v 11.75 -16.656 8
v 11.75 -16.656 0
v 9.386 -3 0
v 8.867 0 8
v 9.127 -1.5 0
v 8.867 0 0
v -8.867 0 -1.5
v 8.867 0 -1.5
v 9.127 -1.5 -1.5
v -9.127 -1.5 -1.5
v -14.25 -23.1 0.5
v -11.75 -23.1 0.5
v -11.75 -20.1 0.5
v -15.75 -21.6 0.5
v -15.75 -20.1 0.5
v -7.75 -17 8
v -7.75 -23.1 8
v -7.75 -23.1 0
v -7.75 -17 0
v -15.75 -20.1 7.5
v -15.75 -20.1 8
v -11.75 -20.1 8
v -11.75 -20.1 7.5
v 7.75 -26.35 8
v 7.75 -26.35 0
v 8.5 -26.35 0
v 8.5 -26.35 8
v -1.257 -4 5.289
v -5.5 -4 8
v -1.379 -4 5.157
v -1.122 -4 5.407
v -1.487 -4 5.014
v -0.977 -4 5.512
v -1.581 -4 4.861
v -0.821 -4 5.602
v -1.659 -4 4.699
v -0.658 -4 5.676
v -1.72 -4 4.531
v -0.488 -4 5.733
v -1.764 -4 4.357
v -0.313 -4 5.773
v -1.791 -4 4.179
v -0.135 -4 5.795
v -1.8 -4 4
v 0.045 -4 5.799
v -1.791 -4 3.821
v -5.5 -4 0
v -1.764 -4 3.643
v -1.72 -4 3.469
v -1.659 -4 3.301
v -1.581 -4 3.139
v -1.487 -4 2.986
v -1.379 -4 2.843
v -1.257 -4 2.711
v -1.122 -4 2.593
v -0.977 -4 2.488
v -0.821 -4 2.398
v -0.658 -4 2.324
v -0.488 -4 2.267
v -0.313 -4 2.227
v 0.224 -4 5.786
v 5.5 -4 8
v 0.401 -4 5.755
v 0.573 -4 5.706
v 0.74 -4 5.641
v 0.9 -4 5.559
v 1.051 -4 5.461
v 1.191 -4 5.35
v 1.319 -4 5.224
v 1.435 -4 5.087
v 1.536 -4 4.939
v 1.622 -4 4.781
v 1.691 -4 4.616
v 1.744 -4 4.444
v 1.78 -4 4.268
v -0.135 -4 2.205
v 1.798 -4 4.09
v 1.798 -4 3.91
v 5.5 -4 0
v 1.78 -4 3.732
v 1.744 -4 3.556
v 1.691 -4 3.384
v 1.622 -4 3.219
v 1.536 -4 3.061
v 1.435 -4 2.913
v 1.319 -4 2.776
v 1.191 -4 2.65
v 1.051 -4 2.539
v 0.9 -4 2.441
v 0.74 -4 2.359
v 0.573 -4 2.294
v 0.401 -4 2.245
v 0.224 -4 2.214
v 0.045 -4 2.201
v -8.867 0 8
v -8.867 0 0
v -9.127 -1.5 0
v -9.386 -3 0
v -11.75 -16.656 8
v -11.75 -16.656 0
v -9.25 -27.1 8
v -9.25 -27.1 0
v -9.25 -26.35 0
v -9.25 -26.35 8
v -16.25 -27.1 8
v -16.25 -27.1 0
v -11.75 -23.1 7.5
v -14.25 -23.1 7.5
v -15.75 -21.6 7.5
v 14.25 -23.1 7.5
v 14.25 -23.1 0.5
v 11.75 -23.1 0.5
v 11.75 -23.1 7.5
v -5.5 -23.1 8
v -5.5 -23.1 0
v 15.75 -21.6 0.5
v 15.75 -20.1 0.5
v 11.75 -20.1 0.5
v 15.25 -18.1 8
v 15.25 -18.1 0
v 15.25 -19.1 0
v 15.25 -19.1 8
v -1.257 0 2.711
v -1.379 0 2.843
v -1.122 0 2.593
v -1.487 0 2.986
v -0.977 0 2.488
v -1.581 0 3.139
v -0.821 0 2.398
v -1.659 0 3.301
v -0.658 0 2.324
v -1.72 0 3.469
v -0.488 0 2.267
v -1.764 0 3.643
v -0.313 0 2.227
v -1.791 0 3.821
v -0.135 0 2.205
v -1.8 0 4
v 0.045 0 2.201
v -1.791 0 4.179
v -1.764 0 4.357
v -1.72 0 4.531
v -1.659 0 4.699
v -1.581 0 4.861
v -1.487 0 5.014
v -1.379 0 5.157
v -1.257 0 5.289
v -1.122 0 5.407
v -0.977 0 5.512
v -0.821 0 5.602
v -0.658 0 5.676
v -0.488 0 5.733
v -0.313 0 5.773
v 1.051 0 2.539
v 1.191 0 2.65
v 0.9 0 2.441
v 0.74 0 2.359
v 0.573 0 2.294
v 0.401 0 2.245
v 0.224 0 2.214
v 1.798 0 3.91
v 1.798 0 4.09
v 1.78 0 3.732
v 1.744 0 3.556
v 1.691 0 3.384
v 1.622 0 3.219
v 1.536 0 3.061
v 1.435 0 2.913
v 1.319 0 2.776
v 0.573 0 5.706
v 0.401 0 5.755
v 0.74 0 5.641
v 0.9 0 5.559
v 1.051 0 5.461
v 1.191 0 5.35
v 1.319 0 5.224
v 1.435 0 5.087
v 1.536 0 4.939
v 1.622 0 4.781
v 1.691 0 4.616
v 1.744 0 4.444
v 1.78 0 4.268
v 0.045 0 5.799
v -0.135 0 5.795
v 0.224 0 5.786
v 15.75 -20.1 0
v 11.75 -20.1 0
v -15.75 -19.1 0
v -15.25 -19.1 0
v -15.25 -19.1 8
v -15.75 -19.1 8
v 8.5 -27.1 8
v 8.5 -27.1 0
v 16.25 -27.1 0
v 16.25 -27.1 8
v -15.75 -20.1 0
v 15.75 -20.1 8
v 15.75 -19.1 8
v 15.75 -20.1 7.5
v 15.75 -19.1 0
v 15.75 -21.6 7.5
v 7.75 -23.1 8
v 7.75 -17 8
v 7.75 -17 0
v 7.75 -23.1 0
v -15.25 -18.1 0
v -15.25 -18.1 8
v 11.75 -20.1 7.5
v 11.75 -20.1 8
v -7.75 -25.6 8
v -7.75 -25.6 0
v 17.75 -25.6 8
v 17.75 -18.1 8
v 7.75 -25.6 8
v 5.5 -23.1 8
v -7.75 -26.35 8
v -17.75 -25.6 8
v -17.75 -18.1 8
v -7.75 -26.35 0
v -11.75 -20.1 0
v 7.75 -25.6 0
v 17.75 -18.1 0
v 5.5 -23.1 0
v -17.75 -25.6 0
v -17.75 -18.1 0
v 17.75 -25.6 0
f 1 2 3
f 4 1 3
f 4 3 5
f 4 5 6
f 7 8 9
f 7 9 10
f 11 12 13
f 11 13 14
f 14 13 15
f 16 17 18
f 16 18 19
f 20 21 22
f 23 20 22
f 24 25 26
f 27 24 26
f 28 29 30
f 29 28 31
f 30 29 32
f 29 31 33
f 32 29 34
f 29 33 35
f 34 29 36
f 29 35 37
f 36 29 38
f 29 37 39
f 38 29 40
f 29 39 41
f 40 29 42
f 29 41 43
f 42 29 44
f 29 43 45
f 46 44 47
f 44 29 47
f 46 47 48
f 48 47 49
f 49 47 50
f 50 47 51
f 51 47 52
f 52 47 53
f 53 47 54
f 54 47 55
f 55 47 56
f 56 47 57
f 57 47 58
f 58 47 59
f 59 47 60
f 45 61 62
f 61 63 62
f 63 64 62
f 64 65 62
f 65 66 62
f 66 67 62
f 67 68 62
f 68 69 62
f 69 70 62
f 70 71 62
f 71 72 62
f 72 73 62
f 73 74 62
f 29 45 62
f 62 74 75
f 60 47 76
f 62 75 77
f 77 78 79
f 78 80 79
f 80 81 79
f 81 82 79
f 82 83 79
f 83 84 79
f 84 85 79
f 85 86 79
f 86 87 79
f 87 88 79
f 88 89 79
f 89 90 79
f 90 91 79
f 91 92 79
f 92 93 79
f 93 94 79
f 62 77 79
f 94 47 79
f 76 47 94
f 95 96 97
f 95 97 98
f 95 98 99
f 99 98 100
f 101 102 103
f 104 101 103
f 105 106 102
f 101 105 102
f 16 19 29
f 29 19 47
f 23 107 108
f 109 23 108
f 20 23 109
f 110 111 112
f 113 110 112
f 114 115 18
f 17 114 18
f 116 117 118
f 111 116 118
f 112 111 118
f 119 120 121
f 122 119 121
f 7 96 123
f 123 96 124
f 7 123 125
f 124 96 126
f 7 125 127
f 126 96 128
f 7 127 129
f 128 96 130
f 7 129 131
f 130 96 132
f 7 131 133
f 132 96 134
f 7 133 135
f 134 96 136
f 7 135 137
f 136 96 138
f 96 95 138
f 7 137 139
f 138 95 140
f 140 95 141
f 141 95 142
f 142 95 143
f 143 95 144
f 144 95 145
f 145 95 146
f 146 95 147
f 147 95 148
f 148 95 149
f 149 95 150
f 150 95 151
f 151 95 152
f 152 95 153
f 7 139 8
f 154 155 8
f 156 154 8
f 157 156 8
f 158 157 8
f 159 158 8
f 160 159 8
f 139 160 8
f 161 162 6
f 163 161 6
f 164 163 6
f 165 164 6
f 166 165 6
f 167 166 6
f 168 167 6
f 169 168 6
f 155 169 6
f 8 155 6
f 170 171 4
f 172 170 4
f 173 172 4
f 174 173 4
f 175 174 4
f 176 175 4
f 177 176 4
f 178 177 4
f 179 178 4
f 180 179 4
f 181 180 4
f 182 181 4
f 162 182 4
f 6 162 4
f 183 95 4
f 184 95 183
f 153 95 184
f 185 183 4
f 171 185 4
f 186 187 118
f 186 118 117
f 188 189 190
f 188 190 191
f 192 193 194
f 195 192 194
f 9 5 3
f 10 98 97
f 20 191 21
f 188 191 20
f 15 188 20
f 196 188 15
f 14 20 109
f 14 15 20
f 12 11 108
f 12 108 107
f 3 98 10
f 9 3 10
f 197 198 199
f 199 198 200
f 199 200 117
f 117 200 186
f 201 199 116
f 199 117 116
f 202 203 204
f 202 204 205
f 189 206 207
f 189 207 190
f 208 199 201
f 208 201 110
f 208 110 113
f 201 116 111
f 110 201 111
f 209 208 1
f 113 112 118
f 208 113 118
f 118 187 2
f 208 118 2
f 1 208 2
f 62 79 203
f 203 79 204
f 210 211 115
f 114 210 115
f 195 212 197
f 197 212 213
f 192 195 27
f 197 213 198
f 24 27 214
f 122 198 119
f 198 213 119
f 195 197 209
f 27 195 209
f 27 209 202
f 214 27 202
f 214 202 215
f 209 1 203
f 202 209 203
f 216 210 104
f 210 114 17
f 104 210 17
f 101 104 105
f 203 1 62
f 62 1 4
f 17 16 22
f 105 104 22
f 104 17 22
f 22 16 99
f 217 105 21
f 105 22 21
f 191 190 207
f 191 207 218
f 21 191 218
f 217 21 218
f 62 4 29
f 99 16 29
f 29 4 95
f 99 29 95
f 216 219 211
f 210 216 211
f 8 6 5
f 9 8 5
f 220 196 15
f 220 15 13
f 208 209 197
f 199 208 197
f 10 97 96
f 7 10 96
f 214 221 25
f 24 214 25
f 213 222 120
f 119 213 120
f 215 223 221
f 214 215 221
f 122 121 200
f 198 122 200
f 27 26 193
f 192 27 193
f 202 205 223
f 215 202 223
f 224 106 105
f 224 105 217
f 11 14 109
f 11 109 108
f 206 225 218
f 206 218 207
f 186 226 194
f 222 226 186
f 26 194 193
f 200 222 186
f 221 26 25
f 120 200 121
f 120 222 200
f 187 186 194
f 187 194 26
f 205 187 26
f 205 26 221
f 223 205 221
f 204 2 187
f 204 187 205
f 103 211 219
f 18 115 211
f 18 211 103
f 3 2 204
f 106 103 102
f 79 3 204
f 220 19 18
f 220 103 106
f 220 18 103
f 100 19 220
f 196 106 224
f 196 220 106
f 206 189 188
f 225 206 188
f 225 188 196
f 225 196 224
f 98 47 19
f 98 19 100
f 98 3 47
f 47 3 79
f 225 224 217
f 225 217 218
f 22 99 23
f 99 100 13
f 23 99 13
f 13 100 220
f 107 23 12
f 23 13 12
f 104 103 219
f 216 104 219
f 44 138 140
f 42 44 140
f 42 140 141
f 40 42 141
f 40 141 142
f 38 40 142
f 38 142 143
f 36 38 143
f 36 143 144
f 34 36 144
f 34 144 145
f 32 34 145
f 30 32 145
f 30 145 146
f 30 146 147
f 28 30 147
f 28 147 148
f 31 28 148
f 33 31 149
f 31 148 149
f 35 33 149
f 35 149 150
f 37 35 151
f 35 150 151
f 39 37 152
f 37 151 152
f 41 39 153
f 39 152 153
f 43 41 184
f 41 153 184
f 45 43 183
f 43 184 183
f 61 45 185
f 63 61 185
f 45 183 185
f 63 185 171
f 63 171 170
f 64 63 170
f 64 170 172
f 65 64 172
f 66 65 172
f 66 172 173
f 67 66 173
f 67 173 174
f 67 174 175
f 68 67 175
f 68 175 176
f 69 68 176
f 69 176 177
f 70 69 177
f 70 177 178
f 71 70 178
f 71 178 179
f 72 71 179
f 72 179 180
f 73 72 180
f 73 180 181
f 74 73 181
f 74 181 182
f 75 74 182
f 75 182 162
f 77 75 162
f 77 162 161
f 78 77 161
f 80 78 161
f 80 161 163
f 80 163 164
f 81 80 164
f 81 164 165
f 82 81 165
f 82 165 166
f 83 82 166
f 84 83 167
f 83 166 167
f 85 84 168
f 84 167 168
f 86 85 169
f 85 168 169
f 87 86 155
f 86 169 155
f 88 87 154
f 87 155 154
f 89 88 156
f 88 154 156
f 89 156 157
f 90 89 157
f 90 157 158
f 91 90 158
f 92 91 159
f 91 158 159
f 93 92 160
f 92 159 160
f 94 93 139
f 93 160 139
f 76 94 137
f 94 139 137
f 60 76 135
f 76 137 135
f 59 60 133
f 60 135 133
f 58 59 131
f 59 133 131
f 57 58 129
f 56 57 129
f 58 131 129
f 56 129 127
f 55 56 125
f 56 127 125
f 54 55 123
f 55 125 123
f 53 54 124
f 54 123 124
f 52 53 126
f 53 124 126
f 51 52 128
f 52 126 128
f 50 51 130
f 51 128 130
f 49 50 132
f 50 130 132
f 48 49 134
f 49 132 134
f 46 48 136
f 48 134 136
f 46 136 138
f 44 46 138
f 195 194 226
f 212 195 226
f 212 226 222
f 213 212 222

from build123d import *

# Parameters (mm, degrees)
BOSS_EXTRUDE1_DEPTH = 8
SKETCH2_R           = 1.8
CUT_EXTRUDE1_DEPTH  = 31.60183818
BOSS_EXTRUDE4_DEPTH = 8
BOSS_EXTRUDE5_DEPTH = 0.5
BOSS_EXTRUDE6_START = -8
BOSS_EXTRUDE6_DEPTH = 0.5
BOSS_EXTRUDE3_DEPTH = 1.5
CHAMFER3_SIZE       = 1.5


with BuildPart() as part:
    # Sketch1 → Boss-Extrude1 (new body)
    with BuildSketch(Plane.XY):
        Polygon((8.867161478, 0), (-8.867161478, 0), (-11.75, -16.656400352), (-11.75, -27.1), (-9.25, -27.1), (-9.25, -26.35), (-7.75, -26.35), (-7.75, -25.6), (-5.5, -23.1), (-7.75, -23.1), (-7.75, -17), (-5.5, -4), (5.5, -4), (7.75, -17), (7.75, -23.1), (5.5, -23.1), (7.75, -25.6), (7.75, -26.35), (8.5, -26.35), (8.5, -27.1), (11.75, -27.1), (11.75, -16.656400352), align=None)
    extrude(amount=BOSS_EXTRUDE1_DEPTH)

    # Sketch2 → Cut-Extrude1 (cut, through all)
    with BuildSketch(Plane(origin=(0, 0, 0), x_dir=(1, 0, 0), z_dir=(0, 1, 0))):
        with Locations(Location((0, -4, 0), (0, 0, 180))):
            Circle(SKETCH2_R)
    extrude(amount=-CUT_EXTRUDE1_DEPTH, mode=Mode.SUBTRACT)

    # Sketch7 → Boss-Extrude4 (add)
    with BuildSketch(Plane(origin=(0, 0, 0), x_dir=(-1, 0, 0), z_dir=(0, 0, -1))):
        Polygon((-11.75, -27.1), (-16.25, -27.1), (-17.75, -25.6), (-17.75, -18.1), (-15.25, -18.1), (-15.25, -19.1), (-15.75, -19.1), (-15.75, -21.6), (-14.25, -23.1), (-11.75, -23.1), align=None)
        Polygon((16.25, -27.1), (17.75, -25.6), (17.75, -18.1), (15.25, -18.1), (15.25, -19.1), (15.75, -19.1), (15.75, -21.6), (14.25, -23.1), (11.75, -23.1), (11.75, -27.1), align=None)
    extrude(amount=-BOSS_EXTRUDE4_DEPTH)

    # Sketch8 → Boss-Extrude5 (add)
    with BuildSketch(Plane(origin=(0, 0, 0), x_dir=(-1, 0, 0), z_dir=(0, 0, -1))):
        Polygon((-11.75, -23.1), (-11.75, -20.1), (-15.75, -20.1), (-15.75, -21.6), (-14.25, -23.1), align=None)
        Polygon((15.75, -20.1), (11.75, -20.1), (11.75, -23.1), (14.25, -23.1), (15.75, -21.6), align=None)
    extrude(amount=-BOSS_EXTRUDE5_DEPTH)

    # Sketch8<2> → Boss-Extrude6 (add)
    with BuildSketch(Plane(origin=(0, 0, 0), x_dir=(-1, 0, 0), z_dir=(0, 0, -1)).offset(BOSS_EXTRUDE6_START)):
        Polygon((-11.75, -23.1), (-11.75, -20.1), (-15.75, -20.1), (-15.75, -21.6), (-14.25, -23.1), align=None)
        Polygon((15.75, -20.1), (11.75, -20.1), (11.75, -23.1), (14.25, -23.1), (15.75, -21.6), align=None)
    extrude(amount=BOSS_EXTRUDE6_DEPTH)

    # Sketch5 → Boss-Extrude3 (add)
    with BuildSketch(Plane(origin=(0, 0, 0), x_dir=(-1, 0, 0), z_dir=(0, 0, -1))):
        Polygon((8.867161478, 0), (-8.867161478, 0), (-9.126776862, -1.5), (9.126776862, -1.5), align=None)
    extrude(amount=BOSS_EXTRUDE3_DEPTH)

    # Chamfer3
    # the kernel refuses this chamfer: 1.5 mm, written as the material it adds along each edge
    with BuildSketch(Plane(origin=(12.984301344, -1.5, 0), x_dir=(0, -0.9996219169112969, 0.02749587661058638), z_dir=(-1, 0, 0))) as chamfer3_piece_1_section:
        Polygon((CHAMFER3_SIZE * 0.999621916911, -CHAMFER3_SIZE * 0.0274958766106), (-CHAMFER3_SIZE * 0.0274958766106, -CHAMFER3_SIZE * 0.999621916911), (0, 0), align=None)
    chamfer3_piece_1 = extrude(amount=25.968602688, mode=Mode.PRIVATE)
    chamfer3_piece_1 = split(chamfer3_piece_1, bisect_by=Plane(origin=(-8.945746351, -0.454045937, -0.498825905), z_dir=(0.9853505058554479, -0.17054143370575114, 0)), keep=Keep.TOP, mode=Mode.PRIVATE)
    chamfer3_piece_1 = split(chamfer3_piece_1, bisect_by=Plane(origin=(8.945746351, -0.454045937, -0.498825905), z_dir=(-0.9853505058554478, -0.17054143370575137, 0)), keep=Keep.TOP, mode=Mode.PRIVATE)
    add(chamfer3_piece_1)
    # the kernel refuses this chamfer: 1.5 mm, written as the material it takes off along each edge


solid = part.part
